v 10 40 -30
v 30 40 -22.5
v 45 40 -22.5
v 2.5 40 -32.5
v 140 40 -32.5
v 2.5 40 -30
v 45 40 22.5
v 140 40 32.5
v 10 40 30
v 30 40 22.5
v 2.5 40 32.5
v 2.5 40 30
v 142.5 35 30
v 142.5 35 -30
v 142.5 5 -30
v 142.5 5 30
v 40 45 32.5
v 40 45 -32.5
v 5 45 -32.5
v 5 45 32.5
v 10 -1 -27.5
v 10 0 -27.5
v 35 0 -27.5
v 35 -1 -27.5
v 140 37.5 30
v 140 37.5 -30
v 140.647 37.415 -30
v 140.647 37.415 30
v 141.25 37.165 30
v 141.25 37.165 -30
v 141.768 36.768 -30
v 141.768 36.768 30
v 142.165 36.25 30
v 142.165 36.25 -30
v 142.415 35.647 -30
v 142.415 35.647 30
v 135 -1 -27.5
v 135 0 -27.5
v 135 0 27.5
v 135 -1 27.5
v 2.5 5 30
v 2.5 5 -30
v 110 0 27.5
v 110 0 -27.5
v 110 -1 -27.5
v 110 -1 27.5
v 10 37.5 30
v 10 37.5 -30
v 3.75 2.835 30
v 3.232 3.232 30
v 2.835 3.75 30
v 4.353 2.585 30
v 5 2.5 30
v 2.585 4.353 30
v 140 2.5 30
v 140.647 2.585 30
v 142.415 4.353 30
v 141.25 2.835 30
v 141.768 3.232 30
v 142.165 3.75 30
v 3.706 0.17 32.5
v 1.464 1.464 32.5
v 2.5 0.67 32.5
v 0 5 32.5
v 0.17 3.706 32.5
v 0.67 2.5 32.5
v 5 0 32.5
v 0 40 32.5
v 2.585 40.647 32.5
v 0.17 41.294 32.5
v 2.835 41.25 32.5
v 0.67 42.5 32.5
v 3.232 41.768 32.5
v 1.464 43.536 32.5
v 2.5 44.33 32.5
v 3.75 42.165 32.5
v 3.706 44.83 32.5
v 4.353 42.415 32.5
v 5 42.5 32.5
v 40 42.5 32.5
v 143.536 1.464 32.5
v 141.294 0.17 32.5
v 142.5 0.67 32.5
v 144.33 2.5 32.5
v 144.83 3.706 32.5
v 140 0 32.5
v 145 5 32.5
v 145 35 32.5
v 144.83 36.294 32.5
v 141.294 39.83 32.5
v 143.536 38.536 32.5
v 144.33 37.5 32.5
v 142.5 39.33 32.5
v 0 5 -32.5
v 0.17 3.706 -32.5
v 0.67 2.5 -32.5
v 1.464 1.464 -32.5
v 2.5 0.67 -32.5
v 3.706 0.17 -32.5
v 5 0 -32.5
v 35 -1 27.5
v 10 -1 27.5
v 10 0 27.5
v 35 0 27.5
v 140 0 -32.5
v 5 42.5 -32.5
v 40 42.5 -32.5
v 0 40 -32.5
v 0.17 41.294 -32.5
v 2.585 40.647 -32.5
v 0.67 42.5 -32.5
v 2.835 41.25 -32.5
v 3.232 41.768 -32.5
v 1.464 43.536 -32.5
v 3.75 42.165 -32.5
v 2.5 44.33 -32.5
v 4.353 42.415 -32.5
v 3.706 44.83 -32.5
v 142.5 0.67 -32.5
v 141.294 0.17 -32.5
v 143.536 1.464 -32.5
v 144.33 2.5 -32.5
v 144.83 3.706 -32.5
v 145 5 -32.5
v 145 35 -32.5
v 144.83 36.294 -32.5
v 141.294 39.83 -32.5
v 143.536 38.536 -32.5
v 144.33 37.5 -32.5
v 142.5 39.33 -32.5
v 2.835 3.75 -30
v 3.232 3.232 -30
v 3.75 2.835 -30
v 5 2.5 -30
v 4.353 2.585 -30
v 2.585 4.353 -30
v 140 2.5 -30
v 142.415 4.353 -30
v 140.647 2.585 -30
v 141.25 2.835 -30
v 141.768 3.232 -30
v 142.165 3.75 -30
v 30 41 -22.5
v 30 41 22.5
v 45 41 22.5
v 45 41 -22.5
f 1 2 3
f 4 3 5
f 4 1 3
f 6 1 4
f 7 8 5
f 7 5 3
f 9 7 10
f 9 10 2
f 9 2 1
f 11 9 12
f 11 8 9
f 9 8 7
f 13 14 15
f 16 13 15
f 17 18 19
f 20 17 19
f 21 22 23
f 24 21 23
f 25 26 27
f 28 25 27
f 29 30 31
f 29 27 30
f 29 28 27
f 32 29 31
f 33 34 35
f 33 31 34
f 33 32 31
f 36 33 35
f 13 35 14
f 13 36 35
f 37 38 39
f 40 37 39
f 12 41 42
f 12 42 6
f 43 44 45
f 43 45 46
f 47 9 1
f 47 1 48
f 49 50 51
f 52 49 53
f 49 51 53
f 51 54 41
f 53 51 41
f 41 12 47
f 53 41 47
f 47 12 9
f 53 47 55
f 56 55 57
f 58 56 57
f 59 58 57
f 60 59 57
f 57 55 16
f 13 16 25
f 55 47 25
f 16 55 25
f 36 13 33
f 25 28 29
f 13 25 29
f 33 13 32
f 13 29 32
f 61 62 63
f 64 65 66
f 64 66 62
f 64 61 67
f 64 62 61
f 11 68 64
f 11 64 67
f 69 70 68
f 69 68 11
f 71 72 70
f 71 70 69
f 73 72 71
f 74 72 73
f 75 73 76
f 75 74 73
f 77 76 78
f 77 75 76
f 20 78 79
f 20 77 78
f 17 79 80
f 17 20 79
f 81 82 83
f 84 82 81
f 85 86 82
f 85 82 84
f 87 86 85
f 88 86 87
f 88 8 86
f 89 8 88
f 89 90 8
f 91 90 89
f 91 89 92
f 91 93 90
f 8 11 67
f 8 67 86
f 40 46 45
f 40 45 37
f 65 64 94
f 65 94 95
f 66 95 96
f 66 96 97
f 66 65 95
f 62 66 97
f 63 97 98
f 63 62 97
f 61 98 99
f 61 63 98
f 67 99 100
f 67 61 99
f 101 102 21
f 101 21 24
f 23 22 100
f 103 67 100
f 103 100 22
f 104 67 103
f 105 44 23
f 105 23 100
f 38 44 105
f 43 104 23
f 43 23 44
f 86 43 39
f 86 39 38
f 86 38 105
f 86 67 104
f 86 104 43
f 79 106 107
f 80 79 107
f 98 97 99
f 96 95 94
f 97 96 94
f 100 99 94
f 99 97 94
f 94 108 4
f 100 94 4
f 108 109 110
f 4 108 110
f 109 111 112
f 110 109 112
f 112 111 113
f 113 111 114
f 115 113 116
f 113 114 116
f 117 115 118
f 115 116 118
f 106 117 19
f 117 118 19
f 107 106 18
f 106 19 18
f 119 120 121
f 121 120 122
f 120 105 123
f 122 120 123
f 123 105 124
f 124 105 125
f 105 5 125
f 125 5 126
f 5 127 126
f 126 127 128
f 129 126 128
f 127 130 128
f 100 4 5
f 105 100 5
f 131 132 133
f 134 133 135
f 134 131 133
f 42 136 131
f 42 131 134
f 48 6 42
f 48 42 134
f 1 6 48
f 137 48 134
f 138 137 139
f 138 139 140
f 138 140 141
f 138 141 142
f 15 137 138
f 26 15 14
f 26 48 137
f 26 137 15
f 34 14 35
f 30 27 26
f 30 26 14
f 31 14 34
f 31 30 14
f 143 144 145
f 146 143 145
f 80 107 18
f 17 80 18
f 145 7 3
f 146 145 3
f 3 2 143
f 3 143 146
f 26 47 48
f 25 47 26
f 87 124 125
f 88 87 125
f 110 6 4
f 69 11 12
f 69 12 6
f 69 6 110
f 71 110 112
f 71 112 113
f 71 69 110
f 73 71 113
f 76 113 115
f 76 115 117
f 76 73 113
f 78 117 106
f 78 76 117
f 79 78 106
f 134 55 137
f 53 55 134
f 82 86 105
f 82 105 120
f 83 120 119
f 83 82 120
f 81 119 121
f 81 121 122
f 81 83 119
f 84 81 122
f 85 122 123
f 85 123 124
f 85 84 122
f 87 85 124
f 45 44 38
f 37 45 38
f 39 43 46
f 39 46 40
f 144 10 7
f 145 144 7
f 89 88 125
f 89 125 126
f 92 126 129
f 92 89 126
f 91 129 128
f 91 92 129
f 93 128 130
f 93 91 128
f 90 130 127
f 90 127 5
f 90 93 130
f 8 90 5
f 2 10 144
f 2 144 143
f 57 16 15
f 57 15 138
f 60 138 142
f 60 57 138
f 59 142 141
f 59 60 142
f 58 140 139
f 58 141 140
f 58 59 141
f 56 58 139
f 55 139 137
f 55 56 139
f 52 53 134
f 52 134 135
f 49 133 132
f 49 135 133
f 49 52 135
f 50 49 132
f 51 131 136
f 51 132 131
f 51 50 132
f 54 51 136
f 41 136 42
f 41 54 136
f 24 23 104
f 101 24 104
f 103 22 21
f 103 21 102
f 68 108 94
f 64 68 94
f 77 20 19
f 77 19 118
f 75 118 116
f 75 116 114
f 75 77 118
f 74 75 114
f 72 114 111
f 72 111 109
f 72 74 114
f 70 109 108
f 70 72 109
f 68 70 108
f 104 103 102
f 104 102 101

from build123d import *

# Parameters (mm, degrees)
BOSS_EXTRUDE1_DEPTH = 32.5
BOSS_EXTRUDE2_DEPTH = 2.5
SKETCH3_W           = 15
SKETCH3_H           = 45
BOSS_EXTRUDE3_DEPTH = 1
SKETCH4_W           = 25
SKETCH4_H           = 55
BOSS_EXTRUDE4_DEPTH = 1


with BuildPart() as part:
    # Sketch1 → Boss-Extrude1 (new, symmetric)
    with BuildSketch(Plane.XY):
        with BuildLine():
            Line((5, 0), (140, 0))
            ThreePointArc((140, 0), (143.535533906, 1.464466094), (145, 5))
            Line((145, 5), (145, 35))
            ThreePointArc((145, 35), (143.535533906, 38.535533906), (140, 40))
            Line((140, 40), (10, 40))
            Line((10, 40), (10, 37.5))
            Line((10, 37.5), (140, 37.5))
            ThreePointArc((140, 37.5), (141.767766953, 36.767766953), (142.5, 35))
            Line((142.5, 35), (142.5, 5))
            ThreePointArc((142.5, 5), (141.767766953, 3.232233047), (140, 2.5))
            Line((140, 2.5), (5, 2.5))
            ThreePointArc((5, 2.5), (3.232233047, 3.232233047), (2.5, 5))
            Line((2.5, 5), (2.5, 40))
            ThreePointArc((2.5, 40), (3.232233047, 41.767766953), (5, 42.5))
            Line((5, 42.5), (40, 42.5))
            Line((40, 42.5), (40, 45))
            Line((40, 45), (5, 45))
            ThreePointArc((5, 45), (1.464466094, 43.535533906), (0, 40))
            Line((0, 40), (0, 5))
            ThreePointArc((0, 5), (1.464466094, 1.464466094), (5, 0))
        make_face()
    extrude(amount=BOSS_EXTRUDE1_DEPTH, both=True)

    # Sketch2 → Boss-Extrude2 (add)
    with BuildSketch(Plane.XY.offset(32.5)):
        with BuildLine():
            Line((0, 40), (0, 5))
            ThreePointArc((0, 5), (1.464466094, 1.464466094), (5, 0))
            Line((5, 0), (140, 0))
            ThreePointArc((140, 0), (143.535533906, 1.464466094), (145, 5))
            Line((145, 5), (145, 35))
            ThreePointArc((145, 35), (143.535533906, 38.535533906), (140, 40))
            Line((140, 40), (0, 40))
        make_face()
    boss_extrude2 = extrude(amount=-BOSS_EXTRUDE2_DEPTH)

    # Mirror1: Boss-Extrude2 across plane
    add(boss_extrude2.mirror(Plane.XY))

    # Sketch3 → Boss-Extrude3 (add)
    with BuildSketch(Plane(origin=(0, 40, 0), x_dir=(1, 0, 0), z_dir=(0, 1, 0))):
        with Locations((37.5, 0)):
            Rectangle(SKETCH3_W, SKETCH3_H)
    extrude(amount=BOSS_EXTRUDE3_DEPTH)

    # Sketch4 → Boss-Extrude4 (add)
    with BuildSketch(Plane.XZ):
        with Locations((22.5, 0)):
            Rectangle(SKETCH4_W, SKETCH4_H)
        with Locations((122.5, 0)):
            Rectangle(SKETCH4_W, SKETCH4_H)
    extrude(amount=BOSS_EXTRUDE4_DEPTH)


solid = part.part
